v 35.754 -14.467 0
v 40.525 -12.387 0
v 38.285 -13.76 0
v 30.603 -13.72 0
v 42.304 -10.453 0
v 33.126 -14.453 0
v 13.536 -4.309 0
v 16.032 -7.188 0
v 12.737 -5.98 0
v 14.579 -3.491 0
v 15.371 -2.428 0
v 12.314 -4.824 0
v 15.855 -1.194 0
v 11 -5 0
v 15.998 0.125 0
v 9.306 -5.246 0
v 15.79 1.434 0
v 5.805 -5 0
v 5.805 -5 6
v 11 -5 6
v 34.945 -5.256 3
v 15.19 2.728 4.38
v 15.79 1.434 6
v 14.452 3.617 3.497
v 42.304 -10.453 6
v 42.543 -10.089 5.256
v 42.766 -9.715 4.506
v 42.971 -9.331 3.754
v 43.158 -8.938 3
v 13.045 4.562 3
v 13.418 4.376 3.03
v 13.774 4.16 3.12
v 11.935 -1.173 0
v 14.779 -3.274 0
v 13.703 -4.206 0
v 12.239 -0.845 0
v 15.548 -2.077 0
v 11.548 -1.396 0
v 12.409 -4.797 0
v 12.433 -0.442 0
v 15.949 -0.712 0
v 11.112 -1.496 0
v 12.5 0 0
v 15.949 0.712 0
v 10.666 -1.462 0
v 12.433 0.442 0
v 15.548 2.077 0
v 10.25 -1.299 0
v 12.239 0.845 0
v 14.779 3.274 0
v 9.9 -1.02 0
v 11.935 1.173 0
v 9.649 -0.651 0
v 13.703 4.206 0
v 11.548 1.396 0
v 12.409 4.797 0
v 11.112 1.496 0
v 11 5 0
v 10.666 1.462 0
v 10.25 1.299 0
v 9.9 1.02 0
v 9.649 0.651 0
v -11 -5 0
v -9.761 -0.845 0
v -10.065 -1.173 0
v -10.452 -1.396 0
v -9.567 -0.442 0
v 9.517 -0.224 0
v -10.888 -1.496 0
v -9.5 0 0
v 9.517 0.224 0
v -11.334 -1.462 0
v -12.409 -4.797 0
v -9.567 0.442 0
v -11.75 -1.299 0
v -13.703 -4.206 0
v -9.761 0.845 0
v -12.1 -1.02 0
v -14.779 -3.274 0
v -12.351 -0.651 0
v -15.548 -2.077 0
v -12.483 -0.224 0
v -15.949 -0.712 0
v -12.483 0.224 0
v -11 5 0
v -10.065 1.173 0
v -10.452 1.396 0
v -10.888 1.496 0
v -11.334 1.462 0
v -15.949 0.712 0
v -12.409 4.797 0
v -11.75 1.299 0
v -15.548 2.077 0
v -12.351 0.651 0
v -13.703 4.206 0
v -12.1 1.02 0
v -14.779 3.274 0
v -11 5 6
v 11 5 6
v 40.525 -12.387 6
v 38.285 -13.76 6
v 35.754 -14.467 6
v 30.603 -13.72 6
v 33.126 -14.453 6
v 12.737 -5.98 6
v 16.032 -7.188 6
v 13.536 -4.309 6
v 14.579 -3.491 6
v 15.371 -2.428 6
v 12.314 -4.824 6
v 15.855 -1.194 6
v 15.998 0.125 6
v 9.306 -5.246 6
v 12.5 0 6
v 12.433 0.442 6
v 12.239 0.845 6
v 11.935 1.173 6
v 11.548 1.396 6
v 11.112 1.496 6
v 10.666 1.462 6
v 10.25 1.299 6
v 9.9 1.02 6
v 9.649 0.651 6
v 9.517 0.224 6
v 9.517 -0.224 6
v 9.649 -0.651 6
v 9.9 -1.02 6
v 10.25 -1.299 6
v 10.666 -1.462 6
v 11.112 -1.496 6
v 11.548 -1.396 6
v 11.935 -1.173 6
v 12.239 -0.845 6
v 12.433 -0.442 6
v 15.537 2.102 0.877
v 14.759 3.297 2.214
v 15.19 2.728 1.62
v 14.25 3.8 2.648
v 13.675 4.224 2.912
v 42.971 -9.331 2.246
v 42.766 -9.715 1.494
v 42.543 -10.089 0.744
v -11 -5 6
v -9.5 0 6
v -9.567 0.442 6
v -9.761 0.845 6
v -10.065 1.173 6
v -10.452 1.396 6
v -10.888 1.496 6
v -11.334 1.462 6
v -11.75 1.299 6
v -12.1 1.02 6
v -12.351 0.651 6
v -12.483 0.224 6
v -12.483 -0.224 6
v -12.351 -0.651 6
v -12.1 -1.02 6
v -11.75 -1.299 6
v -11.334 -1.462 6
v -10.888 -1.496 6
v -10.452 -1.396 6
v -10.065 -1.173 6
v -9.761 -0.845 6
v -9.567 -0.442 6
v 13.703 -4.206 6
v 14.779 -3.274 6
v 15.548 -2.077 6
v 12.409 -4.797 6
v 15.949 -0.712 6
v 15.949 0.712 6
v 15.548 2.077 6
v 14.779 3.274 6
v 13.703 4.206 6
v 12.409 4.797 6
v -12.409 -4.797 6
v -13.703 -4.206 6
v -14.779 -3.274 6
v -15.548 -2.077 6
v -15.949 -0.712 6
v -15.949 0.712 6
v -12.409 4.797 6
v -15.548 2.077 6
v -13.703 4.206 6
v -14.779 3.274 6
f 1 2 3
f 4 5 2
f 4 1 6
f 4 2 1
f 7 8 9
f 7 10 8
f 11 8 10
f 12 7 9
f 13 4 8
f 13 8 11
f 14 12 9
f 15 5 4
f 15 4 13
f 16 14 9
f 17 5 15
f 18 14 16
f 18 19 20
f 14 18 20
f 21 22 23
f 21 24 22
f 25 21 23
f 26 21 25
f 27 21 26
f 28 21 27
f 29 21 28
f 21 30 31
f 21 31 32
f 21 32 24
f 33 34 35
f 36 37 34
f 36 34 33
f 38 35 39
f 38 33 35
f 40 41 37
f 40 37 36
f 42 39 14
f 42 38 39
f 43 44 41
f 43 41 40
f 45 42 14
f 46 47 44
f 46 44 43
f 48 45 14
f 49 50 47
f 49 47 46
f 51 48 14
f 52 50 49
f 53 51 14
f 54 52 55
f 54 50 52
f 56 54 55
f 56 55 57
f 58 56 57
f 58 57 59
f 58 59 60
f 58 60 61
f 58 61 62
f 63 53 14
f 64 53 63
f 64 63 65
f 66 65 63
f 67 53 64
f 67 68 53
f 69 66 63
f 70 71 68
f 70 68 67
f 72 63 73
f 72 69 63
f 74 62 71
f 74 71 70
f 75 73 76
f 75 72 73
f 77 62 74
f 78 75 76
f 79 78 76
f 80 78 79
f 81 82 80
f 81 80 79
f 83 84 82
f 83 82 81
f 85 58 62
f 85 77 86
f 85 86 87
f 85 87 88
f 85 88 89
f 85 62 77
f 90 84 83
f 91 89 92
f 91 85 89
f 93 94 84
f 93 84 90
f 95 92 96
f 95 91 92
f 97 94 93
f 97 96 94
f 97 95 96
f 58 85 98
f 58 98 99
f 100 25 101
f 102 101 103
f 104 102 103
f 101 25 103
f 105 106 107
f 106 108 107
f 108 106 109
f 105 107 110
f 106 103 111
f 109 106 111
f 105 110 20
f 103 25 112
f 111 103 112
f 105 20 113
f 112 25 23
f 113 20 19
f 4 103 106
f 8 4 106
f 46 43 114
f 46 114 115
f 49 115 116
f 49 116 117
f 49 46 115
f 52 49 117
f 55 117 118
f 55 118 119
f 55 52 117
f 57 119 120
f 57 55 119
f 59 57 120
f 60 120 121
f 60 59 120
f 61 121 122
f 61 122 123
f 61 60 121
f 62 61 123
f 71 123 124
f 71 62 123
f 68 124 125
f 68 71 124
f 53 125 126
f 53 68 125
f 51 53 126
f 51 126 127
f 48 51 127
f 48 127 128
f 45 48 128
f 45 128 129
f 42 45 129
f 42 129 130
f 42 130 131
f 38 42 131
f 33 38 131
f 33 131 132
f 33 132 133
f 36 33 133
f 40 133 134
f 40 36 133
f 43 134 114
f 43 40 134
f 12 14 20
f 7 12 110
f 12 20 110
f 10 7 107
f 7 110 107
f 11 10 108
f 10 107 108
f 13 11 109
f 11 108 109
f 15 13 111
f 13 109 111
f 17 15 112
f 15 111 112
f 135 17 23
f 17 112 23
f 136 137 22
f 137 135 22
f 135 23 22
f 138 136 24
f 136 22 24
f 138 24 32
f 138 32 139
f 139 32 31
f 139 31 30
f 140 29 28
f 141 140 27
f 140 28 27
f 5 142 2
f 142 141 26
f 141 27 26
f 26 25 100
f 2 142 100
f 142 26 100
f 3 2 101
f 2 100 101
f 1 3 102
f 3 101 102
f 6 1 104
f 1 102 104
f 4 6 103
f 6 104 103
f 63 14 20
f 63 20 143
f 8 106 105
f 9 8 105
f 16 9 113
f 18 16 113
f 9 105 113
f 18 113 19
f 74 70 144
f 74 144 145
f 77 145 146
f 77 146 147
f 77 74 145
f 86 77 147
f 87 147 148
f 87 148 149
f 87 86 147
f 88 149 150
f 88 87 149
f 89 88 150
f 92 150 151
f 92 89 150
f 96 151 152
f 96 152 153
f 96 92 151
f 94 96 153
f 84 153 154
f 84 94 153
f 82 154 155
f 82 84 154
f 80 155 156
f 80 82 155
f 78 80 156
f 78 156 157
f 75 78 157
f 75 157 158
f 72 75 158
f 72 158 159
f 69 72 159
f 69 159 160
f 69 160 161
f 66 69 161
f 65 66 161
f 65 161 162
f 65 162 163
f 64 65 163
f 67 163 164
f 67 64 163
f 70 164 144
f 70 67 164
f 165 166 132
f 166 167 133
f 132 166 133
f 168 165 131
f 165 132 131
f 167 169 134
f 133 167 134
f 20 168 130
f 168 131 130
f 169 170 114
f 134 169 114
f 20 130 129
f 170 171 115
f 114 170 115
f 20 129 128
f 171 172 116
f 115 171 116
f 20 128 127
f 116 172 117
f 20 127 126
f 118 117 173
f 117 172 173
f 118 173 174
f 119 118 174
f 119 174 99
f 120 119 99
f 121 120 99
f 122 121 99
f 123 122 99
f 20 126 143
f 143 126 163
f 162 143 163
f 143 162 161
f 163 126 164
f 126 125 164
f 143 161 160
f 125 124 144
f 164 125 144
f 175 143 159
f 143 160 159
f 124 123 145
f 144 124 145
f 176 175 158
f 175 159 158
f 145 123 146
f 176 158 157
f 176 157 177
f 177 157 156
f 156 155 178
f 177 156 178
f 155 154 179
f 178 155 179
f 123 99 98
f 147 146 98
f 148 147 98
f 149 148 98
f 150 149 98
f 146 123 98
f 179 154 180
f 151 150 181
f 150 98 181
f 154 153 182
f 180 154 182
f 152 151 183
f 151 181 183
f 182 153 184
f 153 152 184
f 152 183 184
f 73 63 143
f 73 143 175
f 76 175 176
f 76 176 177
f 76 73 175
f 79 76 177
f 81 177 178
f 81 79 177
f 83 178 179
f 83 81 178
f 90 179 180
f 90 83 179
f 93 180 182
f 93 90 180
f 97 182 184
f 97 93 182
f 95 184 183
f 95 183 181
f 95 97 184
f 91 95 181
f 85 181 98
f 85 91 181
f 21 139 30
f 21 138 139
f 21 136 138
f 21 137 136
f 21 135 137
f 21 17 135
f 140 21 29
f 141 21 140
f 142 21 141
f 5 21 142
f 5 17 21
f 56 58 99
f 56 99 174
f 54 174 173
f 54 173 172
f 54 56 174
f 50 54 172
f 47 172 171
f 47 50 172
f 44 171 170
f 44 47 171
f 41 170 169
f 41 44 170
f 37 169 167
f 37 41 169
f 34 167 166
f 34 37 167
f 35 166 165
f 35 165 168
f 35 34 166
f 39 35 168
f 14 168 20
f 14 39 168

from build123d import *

# Parameters (mm, degrees)
SKETCH_1_R      = 1.5
EXTRUDE_1_DEPTH = 6
EXTRUDE_2_DEPTH = 6


with BuildPart() as part:
    # 草图1 → 凸台-拉伸1 (new body)
    with BuildSketch(Plane.XY):
        with BuildLine():
            Line((-11, 5), (11, 5))
            ThreePointArc((11, 5), (16, 0), (11, -5))
            Line((11, -5), (-11, -5))
            ThreePointArc((-11, -5), (-16, 0), (-11, 5))
        make_face()
        with Locations((-11, 0)):
            Circle(SKETCH_1_R, mode=Mode.SUBTRACT)
        with Locations((11, 0)):
            Circle(SKETCH_1_R, mode=Mode.SUBTRACT)
    extrude(amount=EXTRUDE_1_DEPTH)


with BuildPart() as body_2:
    # 草图2 → 凸台-拉伸2 (new body)
    with BuildSketch(Plane.XY.offset(6)):
        with BuildLine():
            Line((30.602691257, -13.719857707), (16.032361282, -7.187659205))
            ThreePointArc((16.032361282, -7.187659205), (11.034404004, -5.553031682), (5.805088555, -5))
            Line((5.805088555, -5), (11, -5))
            ThreePointArc((11, -5), (15.889393664, -1.04586309), (13.045454545, 4.562468159))
            Line((13.045454545, 4.562468159), (34.945301709, -5.255713659))
            Line((34.945301709, -5.255713659), (43.157744395, -8.937531841))
            ThreePointArc((43.157744395, -8.937531841), (37.870669943, -13.928931417), (30.602691257, -13.719857707))
        make_face()
    extrude(amount=-EXTRUDE_2_DEPTH)

    # Surface Cut 1
    split(bisect_by=Plane(origin=(2.383348048, 5.316153128, -3.363620668), x_dir=(0.9124936318129424, -0.40909090909090917, 0), z_dir=(0.35428311972999815, 0.7902426659415334, -0.499999999999998)), keep=Keep.BOTTOM)

    # Surface Cut 2
    split(bisect_by=Plane(origin=(3.446197407, 7.686881126, 4.863620668), x_dir=(0.9124936318129424, -0.40909090909090917, 0), z_dir=(0.35428311972999815, 0.7902426659415334, 0.499999999999998)), keep=Keep.BOTTOM)


solid = Compound([part.part, body_2.part])
